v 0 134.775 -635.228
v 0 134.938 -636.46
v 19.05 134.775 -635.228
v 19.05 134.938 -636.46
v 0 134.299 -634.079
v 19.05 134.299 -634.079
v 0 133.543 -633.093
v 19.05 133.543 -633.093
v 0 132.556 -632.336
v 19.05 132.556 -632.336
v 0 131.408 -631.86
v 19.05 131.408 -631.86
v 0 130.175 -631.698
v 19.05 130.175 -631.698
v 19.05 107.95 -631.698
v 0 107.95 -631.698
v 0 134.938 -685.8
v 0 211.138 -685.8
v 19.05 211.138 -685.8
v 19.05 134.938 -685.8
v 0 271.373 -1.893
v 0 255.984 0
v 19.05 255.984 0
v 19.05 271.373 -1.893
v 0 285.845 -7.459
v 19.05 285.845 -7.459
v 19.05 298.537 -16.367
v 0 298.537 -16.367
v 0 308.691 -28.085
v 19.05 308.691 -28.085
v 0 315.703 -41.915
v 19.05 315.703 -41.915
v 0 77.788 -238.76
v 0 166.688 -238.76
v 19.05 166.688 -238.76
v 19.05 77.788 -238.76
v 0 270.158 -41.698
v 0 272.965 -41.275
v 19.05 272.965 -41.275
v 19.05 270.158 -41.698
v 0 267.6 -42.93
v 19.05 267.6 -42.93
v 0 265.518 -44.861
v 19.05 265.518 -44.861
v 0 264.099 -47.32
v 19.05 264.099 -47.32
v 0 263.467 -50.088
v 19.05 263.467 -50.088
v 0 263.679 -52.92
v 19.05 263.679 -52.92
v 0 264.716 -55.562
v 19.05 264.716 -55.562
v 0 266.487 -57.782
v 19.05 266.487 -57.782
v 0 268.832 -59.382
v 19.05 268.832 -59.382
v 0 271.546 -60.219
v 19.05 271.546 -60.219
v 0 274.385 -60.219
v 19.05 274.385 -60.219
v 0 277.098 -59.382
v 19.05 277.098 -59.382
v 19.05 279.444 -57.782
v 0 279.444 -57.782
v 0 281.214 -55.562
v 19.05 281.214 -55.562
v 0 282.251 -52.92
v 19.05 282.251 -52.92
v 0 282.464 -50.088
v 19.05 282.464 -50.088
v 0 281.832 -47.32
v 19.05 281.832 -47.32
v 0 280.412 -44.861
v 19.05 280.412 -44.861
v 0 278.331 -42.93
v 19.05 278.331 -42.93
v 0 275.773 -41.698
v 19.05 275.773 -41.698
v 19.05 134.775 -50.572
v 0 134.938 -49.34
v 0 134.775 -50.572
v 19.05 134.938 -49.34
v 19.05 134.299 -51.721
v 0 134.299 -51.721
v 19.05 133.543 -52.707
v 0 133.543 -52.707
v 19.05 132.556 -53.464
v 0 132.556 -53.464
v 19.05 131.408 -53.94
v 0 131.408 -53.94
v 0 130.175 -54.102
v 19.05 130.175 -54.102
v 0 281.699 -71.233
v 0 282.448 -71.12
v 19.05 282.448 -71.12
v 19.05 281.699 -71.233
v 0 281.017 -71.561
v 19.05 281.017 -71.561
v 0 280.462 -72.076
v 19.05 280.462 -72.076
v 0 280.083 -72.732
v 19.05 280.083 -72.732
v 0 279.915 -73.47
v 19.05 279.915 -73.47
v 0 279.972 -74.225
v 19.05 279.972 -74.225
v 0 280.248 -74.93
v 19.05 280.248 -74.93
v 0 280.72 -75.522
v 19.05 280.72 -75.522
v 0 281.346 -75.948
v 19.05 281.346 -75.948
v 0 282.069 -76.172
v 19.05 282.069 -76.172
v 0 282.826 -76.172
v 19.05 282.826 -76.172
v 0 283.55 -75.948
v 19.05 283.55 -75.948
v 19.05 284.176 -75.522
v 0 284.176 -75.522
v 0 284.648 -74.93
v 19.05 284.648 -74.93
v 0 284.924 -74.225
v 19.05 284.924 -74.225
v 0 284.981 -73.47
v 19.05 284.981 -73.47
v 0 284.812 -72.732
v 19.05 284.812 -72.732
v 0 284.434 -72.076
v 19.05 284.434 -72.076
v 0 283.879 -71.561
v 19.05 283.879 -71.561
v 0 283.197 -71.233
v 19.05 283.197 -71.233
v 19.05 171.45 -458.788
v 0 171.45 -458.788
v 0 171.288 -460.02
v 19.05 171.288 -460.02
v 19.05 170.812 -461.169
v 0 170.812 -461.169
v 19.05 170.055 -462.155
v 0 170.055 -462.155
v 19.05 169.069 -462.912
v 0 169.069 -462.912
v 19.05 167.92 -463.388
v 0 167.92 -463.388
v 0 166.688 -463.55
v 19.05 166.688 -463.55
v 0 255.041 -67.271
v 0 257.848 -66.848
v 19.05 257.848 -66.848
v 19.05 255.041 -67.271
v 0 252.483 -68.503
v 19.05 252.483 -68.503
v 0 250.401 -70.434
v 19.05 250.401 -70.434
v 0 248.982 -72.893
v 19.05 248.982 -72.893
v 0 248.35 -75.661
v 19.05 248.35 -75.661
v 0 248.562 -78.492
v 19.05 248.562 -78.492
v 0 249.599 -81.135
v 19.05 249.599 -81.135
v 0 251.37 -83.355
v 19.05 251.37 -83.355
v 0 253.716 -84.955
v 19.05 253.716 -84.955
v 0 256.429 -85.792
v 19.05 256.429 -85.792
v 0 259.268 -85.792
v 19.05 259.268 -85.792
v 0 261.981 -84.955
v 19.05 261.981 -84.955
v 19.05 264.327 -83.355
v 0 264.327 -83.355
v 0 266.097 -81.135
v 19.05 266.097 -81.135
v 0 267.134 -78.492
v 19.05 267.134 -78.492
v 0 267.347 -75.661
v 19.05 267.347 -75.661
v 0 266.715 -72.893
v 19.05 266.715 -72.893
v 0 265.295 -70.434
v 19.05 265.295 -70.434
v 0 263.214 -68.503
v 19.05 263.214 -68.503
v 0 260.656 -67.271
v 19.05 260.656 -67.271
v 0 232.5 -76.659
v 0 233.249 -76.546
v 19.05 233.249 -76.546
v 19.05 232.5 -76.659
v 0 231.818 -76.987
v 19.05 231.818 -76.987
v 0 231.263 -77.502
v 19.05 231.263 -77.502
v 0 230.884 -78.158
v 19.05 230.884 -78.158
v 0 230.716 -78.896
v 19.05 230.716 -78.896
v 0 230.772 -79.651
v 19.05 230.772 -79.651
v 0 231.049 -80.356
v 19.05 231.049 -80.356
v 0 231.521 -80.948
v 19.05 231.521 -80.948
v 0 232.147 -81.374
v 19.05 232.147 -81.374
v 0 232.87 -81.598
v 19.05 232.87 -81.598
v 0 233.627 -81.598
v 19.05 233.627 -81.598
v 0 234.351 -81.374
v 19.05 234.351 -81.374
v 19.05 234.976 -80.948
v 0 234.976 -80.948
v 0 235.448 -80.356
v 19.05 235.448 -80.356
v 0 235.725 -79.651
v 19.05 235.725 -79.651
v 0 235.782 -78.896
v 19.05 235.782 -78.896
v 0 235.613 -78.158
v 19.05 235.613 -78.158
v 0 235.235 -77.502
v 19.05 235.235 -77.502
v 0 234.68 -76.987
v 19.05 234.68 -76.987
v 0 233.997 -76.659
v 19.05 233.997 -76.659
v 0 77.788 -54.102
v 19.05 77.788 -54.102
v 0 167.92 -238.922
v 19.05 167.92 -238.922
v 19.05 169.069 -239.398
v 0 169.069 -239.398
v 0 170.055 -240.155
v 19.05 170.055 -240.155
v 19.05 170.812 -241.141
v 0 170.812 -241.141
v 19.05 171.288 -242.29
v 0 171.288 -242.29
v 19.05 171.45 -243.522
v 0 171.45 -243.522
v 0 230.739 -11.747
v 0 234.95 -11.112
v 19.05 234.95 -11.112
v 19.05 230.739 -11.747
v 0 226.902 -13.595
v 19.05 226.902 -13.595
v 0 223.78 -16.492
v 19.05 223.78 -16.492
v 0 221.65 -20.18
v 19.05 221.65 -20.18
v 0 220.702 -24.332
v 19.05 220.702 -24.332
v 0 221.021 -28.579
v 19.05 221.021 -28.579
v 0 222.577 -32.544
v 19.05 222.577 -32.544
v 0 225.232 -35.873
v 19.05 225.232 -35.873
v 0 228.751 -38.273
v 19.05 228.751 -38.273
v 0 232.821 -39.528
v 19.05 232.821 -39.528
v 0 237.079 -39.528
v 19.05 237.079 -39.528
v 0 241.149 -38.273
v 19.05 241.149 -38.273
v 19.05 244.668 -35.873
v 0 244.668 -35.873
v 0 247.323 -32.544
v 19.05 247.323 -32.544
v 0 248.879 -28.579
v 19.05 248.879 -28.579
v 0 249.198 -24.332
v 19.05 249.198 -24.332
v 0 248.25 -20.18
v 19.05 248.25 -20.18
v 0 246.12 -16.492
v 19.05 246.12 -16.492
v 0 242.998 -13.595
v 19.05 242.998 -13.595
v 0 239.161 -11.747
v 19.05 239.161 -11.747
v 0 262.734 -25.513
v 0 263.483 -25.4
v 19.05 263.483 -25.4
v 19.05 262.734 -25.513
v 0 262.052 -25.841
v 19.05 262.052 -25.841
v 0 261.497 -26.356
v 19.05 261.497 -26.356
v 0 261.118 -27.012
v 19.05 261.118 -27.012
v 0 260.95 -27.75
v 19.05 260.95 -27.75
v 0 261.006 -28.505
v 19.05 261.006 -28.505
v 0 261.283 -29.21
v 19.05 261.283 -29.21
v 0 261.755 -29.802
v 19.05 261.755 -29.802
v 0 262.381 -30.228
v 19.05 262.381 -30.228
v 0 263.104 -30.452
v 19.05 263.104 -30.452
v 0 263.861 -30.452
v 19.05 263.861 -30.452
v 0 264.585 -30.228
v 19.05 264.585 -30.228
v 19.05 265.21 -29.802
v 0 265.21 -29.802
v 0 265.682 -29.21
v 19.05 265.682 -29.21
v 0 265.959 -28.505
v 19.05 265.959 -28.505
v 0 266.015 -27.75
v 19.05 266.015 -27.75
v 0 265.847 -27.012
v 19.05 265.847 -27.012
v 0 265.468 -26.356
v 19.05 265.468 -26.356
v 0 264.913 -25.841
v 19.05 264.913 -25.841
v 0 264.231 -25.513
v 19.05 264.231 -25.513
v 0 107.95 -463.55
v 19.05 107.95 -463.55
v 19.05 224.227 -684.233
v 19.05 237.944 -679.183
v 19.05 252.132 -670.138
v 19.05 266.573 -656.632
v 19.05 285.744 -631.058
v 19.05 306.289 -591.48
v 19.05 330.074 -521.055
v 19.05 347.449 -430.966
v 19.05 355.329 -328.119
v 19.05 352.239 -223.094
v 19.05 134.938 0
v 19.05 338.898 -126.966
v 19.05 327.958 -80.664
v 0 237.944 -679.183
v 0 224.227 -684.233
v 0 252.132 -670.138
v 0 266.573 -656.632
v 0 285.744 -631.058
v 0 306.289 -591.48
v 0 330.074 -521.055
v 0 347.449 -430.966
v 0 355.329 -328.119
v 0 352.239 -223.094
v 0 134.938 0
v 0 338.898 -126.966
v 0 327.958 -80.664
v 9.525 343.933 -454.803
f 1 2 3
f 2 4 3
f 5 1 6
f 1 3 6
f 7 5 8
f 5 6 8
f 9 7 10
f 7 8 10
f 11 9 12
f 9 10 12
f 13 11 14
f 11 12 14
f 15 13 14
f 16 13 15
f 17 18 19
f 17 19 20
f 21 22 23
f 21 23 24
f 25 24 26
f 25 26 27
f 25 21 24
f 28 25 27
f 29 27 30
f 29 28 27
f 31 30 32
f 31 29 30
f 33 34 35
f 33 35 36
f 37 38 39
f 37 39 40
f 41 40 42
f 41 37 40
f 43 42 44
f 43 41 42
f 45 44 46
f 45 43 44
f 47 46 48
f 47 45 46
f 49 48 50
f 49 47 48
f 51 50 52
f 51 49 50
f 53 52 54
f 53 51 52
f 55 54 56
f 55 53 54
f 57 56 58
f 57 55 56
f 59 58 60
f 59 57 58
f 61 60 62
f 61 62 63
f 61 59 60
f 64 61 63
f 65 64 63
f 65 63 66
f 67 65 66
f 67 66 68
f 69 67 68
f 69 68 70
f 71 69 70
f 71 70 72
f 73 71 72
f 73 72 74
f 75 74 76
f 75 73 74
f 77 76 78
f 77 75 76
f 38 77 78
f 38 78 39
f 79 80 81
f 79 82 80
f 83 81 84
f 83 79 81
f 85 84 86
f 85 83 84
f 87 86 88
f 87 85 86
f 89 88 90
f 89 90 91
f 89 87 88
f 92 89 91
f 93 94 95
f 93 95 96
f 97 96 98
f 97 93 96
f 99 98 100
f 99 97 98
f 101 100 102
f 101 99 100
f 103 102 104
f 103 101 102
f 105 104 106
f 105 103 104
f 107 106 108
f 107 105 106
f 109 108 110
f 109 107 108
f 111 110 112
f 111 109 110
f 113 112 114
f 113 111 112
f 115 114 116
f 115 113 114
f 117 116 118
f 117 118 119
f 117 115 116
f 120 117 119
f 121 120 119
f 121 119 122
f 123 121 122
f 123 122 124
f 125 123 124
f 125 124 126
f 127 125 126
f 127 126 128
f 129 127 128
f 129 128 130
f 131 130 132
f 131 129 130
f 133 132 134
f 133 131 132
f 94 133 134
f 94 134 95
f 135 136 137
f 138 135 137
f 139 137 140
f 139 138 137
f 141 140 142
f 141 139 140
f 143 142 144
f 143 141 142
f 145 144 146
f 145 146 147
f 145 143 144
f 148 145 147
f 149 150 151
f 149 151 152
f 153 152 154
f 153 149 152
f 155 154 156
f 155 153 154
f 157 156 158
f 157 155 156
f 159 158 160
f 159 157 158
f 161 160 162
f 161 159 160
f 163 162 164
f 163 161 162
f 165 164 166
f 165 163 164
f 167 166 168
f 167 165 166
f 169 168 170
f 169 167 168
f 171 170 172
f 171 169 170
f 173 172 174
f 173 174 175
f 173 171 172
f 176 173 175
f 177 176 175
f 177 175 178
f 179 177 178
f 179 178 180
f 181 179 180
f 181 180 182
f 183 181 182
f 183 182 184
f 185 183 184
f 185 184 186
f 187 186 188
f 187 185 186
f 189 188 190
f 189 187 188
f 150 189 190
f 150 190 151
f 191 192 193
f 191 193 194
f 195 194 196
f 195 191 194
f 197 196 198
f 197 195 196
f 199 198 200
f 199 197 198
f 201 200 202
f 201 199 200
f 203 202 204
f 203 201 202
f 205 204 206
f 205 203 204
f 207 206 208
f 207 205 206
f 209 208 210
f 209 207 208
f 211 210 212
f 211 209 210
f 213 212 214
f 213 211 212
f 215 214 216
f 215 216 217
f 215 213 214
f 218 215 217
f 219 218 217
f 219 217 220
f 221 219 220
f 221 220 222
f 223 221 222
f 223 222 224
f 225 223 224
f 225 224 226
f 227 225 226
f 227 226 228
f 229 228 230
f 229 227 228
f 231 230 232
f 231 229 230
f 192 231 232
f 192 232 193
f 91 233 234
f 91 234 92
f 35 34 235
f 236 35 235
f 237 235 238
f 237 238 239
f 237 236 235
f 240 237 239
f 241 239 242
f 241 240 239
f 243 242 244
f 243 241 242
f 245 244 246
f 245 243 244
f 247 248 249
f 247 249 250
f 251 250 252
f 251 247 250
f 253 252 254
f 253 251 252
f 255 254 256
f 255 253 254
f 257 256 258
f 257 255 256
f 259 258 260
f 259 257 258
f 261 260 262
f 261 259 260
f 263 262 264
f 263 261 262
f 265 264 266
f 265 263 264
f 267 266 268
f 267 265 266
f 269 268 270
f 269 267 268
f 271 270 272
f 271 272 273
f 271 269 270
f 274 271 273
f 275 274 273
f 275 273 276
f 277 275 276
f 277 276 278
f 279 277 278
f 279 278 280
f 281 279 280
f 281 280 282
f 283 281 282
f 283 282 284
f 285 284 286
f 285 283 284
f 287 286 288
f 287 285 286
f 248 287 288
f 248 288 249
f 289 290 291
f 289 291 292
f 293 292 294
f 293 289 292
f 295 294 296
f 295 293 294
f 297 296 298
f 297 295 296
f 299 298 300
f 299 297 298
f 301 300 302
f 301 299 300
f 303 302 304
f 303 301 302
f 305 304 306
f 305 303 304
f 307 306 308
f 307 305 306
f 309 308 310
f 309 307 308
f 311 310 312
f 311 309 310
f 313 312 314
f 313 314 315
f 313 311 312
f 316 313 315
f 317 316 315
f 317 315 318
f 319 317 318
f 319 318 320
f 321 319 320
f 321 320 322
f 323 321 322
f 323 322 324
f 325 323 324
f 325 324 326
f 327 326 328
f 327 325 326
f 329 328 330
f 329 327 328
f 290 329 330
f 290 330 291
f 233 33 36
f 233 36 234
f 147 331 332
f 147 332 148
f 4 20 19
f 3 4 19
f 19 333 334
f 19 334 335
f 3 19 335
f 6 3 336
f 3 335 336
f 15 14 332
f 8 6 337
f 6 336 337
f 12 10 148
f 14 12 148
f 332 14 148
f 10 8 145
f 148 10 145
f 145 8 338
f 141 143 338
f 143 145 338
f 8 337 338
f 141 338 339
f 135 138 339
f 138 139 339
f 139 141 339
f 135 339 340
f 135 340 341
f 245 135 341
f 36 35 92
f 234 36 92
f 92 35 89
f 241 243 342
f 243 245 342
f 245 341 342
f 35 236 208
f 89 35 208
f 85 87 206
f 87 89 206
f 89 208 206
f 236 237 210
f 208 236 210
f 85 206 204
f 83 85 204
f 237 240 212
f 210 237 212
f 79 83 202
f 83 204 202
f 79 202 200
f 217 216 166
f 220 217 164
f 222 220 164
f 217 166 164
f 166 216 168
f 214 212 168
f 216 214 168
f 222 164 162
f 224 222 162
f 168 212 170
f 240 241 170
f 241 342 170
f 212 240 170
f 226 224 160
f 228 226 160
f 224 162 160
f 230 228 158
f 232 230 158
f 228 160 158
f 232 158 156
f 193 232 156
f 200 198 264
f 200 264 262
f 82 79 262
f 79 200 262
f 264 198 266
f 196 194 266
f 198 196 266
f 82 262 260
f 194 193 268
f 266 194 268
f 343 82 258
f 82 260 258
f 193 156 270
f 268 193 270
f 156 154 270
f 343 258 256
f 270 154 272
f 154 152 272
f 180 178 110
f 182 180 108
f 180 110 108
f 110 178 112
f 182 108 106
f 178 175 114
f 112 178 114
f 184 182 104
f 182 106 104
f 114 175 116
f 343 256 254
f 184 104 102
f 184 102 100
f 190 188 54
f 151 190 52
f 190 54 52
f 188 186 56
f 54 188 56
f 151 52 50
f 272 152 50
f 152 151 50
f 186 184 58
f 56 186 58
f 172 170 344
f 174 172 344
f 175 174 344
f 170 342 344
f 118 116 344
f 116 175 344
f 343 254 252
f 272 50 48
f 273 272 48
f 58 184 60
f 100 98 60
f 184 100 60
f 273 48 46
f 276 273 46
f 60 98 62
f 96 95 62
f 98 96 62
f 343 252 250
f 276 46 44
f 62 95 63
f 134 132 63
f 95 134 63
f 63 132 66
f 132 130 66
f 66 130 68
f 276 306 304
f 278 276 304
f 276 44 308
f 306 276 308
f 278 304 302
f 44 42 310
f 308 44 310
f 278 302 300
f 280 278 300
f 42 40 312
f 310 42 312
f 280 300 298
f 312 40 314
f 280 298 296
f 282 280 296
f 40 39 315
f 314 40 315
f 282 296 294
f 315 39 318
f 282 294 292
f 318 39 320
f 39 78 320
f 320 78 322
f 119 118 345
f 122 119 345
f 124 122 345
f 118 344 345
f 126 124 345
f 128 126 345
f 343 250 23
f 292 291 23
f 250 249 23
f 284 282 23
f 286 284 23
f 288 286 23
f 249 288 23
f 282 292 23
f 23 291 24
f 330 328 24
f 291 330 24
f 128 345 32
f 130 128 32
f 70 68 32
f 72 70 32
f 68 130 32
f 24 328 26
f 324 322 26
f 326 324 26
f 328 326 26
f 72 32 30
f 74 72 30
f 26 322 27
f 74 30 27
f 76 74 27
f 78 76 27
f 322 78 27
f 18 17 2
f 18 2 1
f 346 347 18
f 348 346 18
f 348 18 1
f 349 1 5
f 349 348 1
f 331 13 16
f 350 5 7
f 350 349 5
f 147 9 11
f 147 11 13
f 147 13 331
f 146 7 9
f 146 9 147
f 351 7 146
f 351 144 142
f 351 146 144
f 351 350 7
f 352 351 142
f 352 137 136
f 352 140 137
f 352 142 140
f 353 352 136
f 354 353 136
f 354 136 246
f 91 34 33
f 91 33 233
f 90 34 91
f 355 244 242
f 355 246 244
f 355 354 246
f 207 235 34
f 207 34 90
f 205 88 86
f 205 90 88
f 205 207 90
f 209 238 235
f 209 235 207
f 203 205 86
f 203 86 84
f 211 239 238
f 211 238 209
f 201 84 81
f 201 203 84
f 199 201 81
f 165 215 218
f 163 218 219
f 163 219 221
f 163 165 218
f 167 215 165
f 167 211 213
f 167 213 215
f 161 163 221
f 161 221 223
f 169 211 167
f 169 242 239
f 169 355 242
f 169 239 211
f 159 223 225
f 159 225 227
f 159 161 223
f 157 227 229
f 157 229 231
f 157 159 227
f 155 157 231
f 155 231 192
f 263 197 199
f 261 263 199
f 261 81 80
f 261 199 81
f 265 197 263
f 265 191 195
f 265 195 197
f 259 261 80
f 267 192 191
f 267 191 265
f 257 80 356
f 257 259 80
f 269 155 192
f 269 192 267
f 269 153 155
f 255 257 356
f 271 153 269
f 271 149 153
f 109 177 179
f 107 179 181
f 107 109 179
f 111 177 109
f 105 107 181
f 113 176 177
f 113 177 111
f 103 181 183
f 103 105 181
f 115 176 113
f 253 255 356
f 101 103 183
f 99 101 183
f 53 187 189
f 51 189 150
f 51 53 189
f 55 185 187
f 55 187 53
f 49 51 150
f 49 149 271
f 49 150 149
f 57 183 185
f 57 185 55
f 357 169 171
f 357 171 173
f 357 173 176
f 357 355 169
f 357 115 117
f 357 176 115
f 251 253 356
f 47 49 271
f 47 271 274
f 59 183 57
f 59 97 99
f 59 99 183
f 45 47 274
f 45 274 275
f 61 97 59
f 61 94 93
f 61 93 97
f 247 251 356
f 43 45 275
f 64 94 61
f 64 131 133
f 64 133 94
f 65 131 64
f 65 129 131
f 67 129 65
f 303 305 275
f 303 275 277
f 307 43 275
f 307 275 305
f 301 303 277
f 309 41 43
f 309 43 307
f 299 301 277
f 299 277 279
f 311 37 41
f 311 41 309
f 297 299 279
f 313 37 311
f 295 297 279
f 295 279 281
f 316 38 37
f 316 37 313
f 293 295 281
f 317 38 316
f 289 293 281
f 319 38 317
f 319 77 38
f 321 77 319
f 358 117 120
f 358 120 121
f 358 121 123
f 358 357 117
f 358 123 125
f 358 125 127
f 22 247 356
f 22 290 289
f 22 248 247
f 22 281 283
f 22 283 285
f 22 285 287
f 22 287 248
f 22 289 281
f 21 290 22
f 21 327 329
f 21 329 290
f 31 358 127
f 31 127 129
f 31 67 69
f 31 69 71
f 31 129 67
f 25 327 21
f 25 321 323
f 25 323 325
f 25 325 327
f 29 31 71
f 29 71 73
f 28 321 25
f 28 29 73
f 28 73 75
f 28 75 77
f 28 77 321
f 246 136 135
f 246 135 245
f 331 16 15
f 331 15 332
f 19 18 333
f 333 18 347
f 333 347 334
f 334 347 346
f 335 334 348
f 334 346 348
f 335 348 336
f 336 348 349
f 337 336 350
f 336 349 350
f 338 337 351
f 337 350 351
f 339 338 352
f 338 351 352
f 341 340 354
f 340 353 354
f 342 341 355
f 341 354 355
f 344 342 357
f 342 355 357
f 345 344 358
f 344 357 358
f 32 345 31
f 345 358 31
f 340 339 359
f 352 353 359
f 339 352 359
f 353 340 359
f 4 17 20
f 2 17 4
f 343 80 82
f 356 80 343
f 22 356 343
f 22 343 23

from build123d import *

# Parameters (mm, degrees)
SKETCH1_R           = 14.2875
SKETCH1_R_2         = 9.525
SKETCH1_R_3         = 2.54
BOSS_EXTRUDE1_DEPTH = 19.05
FILLET1_R           = 4.7625


with BuildPart() as part:
    # Sketch1 → Boss-Extrude1 (new body)
    with BuildSketch(Plane(origin=(0, 0, 0), x_dir=(0, 0, -1), z_dir=(1, 0, 0))):
        with BuildLine():
            Line((54.102, 134.9375), (0, 134.9375))
            Line((0, 134.9375), (0, 255.983795331))
            ThreePointArc((0, 255.983795331), (11.524561047, 292.463978248), (41.915078603, 315.702646361))
            add(Edge.make_bspline(
                [(685.8, 211.1375), (685.8, 548.429920531), (41.915078603, 315.702646361)],
                knots=[0, 0, 0, 2.332266964, 2.332266964, 2.332266964], degree=2, weights=[1, 0.393708858, 1]))
            Line((685.8, 211.1375), (685.8, 134.9375))
            Line((685.8, 134.9375), (631.698, 134.9375))
            Line((631.698, 134.9375), (631.698, 107.95))
            Line((631.698, 107.95), (463.55, 107.95))
            Line((463.55, 107.95), (463.55, 171.45))
            Line((463.55, 171.45), (238.76, 171.45))
            Line((238.76, 171.45), (238.76, 77.7875))
            Line((238.76, 77.7875), (54.102, 77.7875))
            Line((54.102, 77.7875), (54.102, 134.9375))
        make_face()
        with Locations(Location((25.4, 234.95, 0), (0, 0, 180))):
            Circle(SKETCH1_R, mode=Mode.SUBTRACT)
        with Locations(Location((50.8, 272.96523905, 0), (0, 0, 180))):
            Circle(SKETCH1_R_2, mode=Mode.SUBTRACT)
        with Locations(Location((73.66, 282.447875814, 0), (0, 0, 180))):
            Circle(SKETCH1_R_3, mode=Mode.SUBTRACT)
        with Locations(Location((27.94, 263.482602286, 0), (0, 0, 180))):
            Circle(SKETCH1_R_3, mode=Mode.SUBTRACT)
        with Locations(Location((76.372962562, 257.848285692, 0), (0, 0, 180))):
            Circle(SKETCH1_R_2, mode=Mode.SUBTRACT)
        with Locations(Location((79.085925124, 233.248695571, 0), (0, 0, 180))):
            Circle(SKETCH1_R_3, mode=Mode.SUBTRACT)
    extrude(amount=BOSS_EXTRUDE1_DEPTH)

    # Fillet1
    fillet1_edges = [part.edges().sort_by_distance(p)[0] for p in [
        (9.525, 134.9375, -631.698),
        (9.525, 171.45, -463.55),
        (9.525, 171.45, -238.76),
        (9.525, 134.9375, -54.102),
    ]]
    fillet(fillet1_edges, radius=FILLET1_R)


solid = part.part
